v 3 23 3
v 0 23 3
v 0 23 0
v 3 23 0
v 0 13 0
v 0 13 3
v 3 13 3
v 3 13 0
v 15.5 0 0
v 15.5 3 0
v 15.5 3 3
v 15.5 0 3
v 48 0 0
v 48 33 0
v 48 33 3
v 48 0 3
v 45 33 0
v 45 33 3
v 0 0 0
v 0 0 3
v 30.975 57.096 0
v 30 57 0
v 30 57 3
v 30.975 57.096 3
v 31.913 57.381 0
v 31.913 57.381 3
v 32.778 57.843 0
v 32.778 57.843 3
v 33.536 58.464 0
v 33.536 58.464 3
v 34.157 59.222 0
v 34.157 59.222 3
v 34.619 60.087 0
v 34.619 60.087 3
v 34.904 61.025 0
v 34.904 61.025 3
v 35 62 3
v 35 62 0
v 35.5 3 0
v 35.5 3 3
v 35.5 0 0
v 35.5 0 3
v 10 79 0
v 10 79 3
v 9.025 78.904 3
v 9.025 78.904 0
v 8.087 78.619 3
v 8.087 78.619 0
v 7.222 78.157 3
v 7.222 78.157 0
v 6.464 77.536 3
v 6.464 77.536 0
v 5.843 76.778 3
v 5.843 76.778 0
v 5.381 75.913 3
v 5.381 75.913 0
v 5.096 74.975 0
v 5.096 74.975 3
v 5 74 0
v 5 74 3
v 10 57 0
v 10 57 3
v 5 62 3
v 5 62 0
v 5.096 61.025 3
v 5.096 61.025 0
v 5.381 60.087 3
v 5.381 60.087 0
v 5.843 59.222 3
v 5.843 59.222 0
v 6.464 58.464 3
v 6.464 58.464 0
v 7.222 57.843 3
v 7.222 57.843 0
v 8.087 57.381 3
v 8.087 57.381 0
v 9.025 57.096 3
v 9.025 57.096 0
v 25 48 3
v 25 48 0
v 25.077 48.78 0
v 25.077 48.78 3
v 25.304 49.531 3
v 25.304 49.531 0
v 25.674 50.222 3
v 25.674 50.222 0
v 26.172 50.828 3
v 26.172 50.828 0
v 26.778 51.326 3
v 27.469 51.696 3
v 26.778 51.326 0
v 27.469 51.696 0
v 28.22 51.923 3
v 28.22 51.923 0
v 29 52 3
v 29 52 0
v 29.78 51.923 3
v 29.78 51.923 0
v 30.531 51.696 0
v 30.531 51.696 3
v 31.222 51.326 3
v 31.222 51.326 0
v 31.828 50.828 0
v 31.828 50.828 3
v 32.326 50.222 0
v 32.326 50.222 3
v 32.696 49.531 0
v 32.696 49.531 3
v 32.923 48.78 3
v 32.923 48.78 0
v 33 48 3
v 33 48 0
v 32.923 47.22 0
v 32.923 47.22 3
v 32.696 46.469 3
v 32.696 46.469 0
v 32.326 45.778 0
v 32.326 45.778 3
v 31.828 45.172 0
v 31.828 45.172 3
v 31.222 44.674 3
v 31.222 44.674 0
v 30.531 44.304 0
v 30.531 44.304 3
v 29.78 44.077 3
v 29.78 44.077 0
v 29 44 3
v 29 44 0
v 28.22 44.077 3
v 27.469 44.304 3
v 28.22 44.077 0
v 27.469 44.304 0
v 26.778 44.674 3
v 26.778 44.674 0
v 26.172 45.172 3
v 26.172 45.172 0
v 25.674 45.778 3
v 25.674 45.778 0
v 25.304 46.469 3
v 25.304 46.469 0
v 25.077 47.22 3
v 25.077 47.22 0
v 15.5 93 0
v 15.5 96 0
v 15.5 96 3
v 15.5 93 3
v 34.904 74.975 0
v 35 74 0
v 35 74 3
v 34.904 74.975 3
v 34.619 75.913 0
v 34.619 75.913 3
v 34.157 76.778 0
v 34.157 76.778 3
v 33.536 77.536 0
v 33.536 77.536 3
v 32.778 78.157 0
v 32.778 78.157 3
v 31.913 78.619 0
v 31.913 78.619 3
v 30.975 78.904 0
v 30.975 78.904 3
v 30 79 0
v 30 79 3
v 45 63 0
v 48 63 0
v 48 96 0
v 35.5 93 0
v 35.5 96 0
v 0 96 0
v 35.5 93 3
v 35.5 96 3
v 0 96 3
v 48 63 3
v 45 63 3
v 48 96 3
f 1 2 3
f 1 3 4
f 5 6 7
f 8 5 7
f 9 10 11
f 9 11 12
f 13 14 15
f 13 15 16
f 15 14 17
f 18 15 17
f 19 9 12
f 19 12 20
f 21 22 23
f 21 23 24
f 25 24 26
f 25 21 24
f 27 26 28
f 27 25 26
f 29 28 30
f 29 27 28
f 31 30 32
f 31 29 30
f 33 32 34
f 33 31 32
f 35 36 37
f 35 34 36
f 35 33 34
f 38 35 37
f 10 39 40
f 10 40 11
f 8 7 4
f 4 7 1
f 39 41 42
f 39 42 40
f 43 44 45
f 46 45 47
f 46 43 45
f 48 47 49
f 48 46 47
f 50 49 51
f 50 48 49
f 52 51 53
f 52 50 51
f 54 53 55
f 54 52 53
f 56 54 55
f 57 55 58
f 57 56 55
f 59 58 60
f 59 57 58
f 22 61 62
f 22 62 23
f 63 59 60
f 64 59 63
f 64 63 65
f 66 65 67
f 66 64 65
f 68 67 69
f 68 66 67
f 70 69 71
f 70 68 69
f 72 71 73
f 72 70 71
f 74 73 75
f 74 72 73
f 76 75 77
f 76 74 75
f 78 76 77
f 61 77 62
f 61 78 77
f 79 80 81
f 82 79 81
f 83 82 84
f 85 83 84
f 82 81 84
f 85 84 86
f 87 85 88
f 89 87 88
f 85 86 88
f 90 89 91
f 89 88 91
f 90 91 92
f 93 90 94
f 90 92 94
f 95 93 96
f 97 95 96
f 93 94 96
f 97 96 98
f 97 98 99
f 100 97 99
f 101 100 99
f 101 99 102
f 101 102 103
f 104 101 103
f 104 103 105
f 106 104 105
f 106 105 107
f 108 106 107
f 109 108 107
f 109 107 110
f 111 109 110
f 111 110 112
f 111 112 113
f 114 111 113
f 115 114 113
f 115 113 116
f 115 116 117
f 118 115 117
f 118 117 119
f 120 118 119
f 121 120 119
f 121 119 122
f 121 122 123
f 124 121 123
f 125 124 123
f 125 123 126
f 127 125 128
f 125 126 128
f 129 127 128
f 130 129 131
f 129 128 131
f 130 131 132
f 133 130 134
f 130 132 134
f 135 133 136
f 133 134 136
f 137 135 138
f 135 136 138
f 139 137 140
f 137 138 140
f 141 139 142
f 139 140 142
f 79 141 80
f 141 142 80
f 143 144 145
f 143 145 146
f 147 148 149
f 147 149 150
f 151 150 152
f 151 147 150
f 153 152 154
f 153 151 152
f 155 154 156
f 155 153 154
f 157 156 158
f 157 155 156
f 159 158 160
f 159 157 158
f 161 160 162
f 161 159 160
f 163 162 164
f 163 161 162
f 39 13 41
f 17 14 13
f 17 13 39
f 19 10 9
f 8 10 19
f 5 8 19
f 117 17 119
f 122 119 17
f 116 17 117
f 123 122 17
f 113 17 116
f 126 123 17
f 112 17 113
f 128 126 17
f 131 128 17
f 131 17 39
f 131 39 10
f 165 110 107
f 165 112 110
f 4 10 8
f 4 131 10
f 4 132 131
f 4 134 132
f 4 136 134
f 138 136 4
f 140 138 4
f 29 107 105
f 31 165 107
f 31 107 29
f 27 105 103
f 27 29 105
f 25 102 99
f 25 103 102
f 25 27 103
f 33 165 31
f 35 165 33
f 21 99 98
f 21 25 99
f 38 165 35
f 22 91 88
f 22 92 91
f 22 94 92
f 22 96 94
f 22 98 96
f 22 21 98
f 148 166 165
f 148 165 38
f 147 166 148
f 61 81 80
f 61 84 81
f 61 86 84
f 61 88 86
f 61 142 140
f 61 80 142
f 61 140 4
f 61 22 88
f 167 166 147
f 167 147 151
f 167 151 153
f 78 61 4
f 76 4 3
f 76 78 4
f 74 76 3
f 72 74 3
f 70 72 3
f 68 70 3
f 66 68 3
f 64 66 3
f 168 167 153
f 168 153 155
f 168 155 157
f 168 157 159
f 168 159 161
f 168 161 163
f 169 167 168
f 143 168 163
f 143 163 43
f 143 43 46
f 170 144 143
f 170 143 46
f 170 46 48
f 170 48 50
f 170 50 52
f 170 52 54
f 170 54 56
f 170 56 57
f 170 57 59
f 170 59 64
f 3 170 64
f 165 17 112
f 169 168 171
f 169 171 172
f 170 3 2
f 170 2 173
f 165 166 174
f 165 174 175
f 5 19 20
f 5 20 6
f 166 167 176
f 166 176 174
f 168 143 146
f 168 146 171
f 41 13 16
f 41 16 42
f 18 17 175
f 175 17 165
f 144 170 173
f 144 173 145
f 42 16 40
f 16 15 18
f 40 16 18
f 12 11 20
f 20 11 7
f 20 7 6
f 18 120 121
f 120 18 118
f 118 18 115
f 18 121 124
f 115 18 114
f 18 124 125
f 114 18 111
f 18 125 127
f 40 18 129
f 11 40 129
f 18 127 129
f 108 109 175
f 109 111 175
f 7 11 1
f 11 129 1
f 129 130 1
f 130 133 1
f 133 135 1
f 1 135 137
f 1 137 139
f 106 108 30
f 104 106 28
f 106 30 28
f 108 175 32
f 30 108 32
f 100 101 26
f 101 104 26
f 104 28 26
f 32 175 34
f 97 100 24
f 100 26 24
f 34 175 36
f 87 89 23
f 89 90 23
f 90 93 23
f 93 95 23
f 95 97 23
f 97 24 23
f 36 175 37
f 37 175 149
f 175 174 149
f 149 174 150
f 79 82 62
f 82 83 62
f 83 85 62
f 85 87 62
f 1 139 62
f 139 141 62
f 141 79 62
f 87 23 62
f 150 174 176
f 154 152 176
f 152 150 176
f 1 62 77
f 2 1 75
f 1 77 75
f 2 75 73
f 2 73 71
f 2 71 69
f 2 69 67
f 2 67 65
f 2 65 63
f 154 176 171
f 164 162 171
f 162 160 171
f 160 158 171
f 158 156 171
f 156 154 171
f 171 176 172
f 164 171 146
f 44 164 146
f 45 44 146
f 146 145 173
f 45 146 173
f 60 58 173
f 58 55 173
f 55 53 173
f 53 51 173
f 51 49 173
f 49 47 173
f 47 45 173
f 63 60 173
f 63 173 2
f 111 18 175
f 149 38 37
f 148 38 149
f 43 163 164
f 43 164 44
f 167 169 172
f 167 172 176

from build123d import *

# Parameters (mm, degrees)
BOSS_EXTRUDE1_DEPTH = 3
SKETCH2_W           = 3
SKETCH2_H           = 10
CUT_EXTRUDE1_DEPTH  = 108.373181009
SKETCH3_R           = 4
CUT_EXTRUDE2_DEPTH  = 108.373181009
SKETCH4_W           = 3
SKETCH4_H           = 30
CUT_EXTRUDE3_DEPTH  = 108.373181009
CUT_EXTRUDE4_DEPTH  = 108.373181009


with BuildPart() as part:
    # Sketch1 → Boss-Extrude1 (new body)
    with BuildSketch(Plane.XY):
        Polygon((0, 0), (0, 96), (15.5, 96), (15.5, 93), (35.5, 93), (35.5, 96), (48, 96), (48, 0), (35.5, 0), (35.5, 3), (15.5, 3), (15.5, 0), align=None)
    extrude(amount=BOSS_EXTRUDE1_DEPTH)

    # Sketch2 → Cut-Extrude1 (cut, through all)
    with BuildSketch(Plane.XY.offset(3)):
        with Locations((1.5, 18)):
            Rectangle(SKETCH2_W, SKETCH2_H)
    extrude(amount=-CUT_EXTRUDE1_DEPTH, mode=Mode.SUBTRACT)

    # Sketch3 → Cut-Extrude2 (cut, through all)
    with BuildSketch(Plane(origin=(0, 0, 0), x_dir=(-1, 0, 0), z_dir=(0, 0, -1))):
        with Locations((-29, 48)):
            Circle(SKETCH3_R)
    extrude(amount=-CUT_EXTRUDE2_DEPTH, mode=Mode.SUBTRACT)

    # Sketch4 → Cut-Extrude3 (cut, through all)
    with BuildSketch(Plane(origin=(0, 0, 0), x_dir=(-1, 0, 0), z_dir=(0, 0, -1))):
        with Locations((-46.5, 48)):
            Rectangle(SKETCH4_W, SKETCH4_H)
    extrude(amount=-CUT_EXTRUDE3_DEPTH, mode=Mode.SUBTRACT)

    # Sketch5 → Cut-Extrude4 (cut, through all)
    with BuildSketch(Plane(origin=(0, 0, 0), x_dir=(-1, 0, 0), z_dir=(0, 0, -1))):
        with BuildLine():
            Line((-10, 57), (-30, 57))
            ThreePointArc((-30, 57), (-33.535533906, 58.464466094), (-35, 62))
            Line((-35, 62), (-35, 74))
            ThreePointArc((-35, 74), (-33.535533906, 77.535533906), (-30, 79))
            Line((-30, 79), (-10, 79))
            ThreePointArc((-10, 79), (-6.464466094, 77.535533906), (-5, 74))
            Line((-5, 74), (-5, 62))
            ThreePointArc((-5, 62), (-6.464466094, 58.464466094), (-10, 57))
        make_face()
    extrude(amount=-CUT_EXTRUDE4_DEPTH, mode=Mode.SUBTRACT)


solid = part.part
